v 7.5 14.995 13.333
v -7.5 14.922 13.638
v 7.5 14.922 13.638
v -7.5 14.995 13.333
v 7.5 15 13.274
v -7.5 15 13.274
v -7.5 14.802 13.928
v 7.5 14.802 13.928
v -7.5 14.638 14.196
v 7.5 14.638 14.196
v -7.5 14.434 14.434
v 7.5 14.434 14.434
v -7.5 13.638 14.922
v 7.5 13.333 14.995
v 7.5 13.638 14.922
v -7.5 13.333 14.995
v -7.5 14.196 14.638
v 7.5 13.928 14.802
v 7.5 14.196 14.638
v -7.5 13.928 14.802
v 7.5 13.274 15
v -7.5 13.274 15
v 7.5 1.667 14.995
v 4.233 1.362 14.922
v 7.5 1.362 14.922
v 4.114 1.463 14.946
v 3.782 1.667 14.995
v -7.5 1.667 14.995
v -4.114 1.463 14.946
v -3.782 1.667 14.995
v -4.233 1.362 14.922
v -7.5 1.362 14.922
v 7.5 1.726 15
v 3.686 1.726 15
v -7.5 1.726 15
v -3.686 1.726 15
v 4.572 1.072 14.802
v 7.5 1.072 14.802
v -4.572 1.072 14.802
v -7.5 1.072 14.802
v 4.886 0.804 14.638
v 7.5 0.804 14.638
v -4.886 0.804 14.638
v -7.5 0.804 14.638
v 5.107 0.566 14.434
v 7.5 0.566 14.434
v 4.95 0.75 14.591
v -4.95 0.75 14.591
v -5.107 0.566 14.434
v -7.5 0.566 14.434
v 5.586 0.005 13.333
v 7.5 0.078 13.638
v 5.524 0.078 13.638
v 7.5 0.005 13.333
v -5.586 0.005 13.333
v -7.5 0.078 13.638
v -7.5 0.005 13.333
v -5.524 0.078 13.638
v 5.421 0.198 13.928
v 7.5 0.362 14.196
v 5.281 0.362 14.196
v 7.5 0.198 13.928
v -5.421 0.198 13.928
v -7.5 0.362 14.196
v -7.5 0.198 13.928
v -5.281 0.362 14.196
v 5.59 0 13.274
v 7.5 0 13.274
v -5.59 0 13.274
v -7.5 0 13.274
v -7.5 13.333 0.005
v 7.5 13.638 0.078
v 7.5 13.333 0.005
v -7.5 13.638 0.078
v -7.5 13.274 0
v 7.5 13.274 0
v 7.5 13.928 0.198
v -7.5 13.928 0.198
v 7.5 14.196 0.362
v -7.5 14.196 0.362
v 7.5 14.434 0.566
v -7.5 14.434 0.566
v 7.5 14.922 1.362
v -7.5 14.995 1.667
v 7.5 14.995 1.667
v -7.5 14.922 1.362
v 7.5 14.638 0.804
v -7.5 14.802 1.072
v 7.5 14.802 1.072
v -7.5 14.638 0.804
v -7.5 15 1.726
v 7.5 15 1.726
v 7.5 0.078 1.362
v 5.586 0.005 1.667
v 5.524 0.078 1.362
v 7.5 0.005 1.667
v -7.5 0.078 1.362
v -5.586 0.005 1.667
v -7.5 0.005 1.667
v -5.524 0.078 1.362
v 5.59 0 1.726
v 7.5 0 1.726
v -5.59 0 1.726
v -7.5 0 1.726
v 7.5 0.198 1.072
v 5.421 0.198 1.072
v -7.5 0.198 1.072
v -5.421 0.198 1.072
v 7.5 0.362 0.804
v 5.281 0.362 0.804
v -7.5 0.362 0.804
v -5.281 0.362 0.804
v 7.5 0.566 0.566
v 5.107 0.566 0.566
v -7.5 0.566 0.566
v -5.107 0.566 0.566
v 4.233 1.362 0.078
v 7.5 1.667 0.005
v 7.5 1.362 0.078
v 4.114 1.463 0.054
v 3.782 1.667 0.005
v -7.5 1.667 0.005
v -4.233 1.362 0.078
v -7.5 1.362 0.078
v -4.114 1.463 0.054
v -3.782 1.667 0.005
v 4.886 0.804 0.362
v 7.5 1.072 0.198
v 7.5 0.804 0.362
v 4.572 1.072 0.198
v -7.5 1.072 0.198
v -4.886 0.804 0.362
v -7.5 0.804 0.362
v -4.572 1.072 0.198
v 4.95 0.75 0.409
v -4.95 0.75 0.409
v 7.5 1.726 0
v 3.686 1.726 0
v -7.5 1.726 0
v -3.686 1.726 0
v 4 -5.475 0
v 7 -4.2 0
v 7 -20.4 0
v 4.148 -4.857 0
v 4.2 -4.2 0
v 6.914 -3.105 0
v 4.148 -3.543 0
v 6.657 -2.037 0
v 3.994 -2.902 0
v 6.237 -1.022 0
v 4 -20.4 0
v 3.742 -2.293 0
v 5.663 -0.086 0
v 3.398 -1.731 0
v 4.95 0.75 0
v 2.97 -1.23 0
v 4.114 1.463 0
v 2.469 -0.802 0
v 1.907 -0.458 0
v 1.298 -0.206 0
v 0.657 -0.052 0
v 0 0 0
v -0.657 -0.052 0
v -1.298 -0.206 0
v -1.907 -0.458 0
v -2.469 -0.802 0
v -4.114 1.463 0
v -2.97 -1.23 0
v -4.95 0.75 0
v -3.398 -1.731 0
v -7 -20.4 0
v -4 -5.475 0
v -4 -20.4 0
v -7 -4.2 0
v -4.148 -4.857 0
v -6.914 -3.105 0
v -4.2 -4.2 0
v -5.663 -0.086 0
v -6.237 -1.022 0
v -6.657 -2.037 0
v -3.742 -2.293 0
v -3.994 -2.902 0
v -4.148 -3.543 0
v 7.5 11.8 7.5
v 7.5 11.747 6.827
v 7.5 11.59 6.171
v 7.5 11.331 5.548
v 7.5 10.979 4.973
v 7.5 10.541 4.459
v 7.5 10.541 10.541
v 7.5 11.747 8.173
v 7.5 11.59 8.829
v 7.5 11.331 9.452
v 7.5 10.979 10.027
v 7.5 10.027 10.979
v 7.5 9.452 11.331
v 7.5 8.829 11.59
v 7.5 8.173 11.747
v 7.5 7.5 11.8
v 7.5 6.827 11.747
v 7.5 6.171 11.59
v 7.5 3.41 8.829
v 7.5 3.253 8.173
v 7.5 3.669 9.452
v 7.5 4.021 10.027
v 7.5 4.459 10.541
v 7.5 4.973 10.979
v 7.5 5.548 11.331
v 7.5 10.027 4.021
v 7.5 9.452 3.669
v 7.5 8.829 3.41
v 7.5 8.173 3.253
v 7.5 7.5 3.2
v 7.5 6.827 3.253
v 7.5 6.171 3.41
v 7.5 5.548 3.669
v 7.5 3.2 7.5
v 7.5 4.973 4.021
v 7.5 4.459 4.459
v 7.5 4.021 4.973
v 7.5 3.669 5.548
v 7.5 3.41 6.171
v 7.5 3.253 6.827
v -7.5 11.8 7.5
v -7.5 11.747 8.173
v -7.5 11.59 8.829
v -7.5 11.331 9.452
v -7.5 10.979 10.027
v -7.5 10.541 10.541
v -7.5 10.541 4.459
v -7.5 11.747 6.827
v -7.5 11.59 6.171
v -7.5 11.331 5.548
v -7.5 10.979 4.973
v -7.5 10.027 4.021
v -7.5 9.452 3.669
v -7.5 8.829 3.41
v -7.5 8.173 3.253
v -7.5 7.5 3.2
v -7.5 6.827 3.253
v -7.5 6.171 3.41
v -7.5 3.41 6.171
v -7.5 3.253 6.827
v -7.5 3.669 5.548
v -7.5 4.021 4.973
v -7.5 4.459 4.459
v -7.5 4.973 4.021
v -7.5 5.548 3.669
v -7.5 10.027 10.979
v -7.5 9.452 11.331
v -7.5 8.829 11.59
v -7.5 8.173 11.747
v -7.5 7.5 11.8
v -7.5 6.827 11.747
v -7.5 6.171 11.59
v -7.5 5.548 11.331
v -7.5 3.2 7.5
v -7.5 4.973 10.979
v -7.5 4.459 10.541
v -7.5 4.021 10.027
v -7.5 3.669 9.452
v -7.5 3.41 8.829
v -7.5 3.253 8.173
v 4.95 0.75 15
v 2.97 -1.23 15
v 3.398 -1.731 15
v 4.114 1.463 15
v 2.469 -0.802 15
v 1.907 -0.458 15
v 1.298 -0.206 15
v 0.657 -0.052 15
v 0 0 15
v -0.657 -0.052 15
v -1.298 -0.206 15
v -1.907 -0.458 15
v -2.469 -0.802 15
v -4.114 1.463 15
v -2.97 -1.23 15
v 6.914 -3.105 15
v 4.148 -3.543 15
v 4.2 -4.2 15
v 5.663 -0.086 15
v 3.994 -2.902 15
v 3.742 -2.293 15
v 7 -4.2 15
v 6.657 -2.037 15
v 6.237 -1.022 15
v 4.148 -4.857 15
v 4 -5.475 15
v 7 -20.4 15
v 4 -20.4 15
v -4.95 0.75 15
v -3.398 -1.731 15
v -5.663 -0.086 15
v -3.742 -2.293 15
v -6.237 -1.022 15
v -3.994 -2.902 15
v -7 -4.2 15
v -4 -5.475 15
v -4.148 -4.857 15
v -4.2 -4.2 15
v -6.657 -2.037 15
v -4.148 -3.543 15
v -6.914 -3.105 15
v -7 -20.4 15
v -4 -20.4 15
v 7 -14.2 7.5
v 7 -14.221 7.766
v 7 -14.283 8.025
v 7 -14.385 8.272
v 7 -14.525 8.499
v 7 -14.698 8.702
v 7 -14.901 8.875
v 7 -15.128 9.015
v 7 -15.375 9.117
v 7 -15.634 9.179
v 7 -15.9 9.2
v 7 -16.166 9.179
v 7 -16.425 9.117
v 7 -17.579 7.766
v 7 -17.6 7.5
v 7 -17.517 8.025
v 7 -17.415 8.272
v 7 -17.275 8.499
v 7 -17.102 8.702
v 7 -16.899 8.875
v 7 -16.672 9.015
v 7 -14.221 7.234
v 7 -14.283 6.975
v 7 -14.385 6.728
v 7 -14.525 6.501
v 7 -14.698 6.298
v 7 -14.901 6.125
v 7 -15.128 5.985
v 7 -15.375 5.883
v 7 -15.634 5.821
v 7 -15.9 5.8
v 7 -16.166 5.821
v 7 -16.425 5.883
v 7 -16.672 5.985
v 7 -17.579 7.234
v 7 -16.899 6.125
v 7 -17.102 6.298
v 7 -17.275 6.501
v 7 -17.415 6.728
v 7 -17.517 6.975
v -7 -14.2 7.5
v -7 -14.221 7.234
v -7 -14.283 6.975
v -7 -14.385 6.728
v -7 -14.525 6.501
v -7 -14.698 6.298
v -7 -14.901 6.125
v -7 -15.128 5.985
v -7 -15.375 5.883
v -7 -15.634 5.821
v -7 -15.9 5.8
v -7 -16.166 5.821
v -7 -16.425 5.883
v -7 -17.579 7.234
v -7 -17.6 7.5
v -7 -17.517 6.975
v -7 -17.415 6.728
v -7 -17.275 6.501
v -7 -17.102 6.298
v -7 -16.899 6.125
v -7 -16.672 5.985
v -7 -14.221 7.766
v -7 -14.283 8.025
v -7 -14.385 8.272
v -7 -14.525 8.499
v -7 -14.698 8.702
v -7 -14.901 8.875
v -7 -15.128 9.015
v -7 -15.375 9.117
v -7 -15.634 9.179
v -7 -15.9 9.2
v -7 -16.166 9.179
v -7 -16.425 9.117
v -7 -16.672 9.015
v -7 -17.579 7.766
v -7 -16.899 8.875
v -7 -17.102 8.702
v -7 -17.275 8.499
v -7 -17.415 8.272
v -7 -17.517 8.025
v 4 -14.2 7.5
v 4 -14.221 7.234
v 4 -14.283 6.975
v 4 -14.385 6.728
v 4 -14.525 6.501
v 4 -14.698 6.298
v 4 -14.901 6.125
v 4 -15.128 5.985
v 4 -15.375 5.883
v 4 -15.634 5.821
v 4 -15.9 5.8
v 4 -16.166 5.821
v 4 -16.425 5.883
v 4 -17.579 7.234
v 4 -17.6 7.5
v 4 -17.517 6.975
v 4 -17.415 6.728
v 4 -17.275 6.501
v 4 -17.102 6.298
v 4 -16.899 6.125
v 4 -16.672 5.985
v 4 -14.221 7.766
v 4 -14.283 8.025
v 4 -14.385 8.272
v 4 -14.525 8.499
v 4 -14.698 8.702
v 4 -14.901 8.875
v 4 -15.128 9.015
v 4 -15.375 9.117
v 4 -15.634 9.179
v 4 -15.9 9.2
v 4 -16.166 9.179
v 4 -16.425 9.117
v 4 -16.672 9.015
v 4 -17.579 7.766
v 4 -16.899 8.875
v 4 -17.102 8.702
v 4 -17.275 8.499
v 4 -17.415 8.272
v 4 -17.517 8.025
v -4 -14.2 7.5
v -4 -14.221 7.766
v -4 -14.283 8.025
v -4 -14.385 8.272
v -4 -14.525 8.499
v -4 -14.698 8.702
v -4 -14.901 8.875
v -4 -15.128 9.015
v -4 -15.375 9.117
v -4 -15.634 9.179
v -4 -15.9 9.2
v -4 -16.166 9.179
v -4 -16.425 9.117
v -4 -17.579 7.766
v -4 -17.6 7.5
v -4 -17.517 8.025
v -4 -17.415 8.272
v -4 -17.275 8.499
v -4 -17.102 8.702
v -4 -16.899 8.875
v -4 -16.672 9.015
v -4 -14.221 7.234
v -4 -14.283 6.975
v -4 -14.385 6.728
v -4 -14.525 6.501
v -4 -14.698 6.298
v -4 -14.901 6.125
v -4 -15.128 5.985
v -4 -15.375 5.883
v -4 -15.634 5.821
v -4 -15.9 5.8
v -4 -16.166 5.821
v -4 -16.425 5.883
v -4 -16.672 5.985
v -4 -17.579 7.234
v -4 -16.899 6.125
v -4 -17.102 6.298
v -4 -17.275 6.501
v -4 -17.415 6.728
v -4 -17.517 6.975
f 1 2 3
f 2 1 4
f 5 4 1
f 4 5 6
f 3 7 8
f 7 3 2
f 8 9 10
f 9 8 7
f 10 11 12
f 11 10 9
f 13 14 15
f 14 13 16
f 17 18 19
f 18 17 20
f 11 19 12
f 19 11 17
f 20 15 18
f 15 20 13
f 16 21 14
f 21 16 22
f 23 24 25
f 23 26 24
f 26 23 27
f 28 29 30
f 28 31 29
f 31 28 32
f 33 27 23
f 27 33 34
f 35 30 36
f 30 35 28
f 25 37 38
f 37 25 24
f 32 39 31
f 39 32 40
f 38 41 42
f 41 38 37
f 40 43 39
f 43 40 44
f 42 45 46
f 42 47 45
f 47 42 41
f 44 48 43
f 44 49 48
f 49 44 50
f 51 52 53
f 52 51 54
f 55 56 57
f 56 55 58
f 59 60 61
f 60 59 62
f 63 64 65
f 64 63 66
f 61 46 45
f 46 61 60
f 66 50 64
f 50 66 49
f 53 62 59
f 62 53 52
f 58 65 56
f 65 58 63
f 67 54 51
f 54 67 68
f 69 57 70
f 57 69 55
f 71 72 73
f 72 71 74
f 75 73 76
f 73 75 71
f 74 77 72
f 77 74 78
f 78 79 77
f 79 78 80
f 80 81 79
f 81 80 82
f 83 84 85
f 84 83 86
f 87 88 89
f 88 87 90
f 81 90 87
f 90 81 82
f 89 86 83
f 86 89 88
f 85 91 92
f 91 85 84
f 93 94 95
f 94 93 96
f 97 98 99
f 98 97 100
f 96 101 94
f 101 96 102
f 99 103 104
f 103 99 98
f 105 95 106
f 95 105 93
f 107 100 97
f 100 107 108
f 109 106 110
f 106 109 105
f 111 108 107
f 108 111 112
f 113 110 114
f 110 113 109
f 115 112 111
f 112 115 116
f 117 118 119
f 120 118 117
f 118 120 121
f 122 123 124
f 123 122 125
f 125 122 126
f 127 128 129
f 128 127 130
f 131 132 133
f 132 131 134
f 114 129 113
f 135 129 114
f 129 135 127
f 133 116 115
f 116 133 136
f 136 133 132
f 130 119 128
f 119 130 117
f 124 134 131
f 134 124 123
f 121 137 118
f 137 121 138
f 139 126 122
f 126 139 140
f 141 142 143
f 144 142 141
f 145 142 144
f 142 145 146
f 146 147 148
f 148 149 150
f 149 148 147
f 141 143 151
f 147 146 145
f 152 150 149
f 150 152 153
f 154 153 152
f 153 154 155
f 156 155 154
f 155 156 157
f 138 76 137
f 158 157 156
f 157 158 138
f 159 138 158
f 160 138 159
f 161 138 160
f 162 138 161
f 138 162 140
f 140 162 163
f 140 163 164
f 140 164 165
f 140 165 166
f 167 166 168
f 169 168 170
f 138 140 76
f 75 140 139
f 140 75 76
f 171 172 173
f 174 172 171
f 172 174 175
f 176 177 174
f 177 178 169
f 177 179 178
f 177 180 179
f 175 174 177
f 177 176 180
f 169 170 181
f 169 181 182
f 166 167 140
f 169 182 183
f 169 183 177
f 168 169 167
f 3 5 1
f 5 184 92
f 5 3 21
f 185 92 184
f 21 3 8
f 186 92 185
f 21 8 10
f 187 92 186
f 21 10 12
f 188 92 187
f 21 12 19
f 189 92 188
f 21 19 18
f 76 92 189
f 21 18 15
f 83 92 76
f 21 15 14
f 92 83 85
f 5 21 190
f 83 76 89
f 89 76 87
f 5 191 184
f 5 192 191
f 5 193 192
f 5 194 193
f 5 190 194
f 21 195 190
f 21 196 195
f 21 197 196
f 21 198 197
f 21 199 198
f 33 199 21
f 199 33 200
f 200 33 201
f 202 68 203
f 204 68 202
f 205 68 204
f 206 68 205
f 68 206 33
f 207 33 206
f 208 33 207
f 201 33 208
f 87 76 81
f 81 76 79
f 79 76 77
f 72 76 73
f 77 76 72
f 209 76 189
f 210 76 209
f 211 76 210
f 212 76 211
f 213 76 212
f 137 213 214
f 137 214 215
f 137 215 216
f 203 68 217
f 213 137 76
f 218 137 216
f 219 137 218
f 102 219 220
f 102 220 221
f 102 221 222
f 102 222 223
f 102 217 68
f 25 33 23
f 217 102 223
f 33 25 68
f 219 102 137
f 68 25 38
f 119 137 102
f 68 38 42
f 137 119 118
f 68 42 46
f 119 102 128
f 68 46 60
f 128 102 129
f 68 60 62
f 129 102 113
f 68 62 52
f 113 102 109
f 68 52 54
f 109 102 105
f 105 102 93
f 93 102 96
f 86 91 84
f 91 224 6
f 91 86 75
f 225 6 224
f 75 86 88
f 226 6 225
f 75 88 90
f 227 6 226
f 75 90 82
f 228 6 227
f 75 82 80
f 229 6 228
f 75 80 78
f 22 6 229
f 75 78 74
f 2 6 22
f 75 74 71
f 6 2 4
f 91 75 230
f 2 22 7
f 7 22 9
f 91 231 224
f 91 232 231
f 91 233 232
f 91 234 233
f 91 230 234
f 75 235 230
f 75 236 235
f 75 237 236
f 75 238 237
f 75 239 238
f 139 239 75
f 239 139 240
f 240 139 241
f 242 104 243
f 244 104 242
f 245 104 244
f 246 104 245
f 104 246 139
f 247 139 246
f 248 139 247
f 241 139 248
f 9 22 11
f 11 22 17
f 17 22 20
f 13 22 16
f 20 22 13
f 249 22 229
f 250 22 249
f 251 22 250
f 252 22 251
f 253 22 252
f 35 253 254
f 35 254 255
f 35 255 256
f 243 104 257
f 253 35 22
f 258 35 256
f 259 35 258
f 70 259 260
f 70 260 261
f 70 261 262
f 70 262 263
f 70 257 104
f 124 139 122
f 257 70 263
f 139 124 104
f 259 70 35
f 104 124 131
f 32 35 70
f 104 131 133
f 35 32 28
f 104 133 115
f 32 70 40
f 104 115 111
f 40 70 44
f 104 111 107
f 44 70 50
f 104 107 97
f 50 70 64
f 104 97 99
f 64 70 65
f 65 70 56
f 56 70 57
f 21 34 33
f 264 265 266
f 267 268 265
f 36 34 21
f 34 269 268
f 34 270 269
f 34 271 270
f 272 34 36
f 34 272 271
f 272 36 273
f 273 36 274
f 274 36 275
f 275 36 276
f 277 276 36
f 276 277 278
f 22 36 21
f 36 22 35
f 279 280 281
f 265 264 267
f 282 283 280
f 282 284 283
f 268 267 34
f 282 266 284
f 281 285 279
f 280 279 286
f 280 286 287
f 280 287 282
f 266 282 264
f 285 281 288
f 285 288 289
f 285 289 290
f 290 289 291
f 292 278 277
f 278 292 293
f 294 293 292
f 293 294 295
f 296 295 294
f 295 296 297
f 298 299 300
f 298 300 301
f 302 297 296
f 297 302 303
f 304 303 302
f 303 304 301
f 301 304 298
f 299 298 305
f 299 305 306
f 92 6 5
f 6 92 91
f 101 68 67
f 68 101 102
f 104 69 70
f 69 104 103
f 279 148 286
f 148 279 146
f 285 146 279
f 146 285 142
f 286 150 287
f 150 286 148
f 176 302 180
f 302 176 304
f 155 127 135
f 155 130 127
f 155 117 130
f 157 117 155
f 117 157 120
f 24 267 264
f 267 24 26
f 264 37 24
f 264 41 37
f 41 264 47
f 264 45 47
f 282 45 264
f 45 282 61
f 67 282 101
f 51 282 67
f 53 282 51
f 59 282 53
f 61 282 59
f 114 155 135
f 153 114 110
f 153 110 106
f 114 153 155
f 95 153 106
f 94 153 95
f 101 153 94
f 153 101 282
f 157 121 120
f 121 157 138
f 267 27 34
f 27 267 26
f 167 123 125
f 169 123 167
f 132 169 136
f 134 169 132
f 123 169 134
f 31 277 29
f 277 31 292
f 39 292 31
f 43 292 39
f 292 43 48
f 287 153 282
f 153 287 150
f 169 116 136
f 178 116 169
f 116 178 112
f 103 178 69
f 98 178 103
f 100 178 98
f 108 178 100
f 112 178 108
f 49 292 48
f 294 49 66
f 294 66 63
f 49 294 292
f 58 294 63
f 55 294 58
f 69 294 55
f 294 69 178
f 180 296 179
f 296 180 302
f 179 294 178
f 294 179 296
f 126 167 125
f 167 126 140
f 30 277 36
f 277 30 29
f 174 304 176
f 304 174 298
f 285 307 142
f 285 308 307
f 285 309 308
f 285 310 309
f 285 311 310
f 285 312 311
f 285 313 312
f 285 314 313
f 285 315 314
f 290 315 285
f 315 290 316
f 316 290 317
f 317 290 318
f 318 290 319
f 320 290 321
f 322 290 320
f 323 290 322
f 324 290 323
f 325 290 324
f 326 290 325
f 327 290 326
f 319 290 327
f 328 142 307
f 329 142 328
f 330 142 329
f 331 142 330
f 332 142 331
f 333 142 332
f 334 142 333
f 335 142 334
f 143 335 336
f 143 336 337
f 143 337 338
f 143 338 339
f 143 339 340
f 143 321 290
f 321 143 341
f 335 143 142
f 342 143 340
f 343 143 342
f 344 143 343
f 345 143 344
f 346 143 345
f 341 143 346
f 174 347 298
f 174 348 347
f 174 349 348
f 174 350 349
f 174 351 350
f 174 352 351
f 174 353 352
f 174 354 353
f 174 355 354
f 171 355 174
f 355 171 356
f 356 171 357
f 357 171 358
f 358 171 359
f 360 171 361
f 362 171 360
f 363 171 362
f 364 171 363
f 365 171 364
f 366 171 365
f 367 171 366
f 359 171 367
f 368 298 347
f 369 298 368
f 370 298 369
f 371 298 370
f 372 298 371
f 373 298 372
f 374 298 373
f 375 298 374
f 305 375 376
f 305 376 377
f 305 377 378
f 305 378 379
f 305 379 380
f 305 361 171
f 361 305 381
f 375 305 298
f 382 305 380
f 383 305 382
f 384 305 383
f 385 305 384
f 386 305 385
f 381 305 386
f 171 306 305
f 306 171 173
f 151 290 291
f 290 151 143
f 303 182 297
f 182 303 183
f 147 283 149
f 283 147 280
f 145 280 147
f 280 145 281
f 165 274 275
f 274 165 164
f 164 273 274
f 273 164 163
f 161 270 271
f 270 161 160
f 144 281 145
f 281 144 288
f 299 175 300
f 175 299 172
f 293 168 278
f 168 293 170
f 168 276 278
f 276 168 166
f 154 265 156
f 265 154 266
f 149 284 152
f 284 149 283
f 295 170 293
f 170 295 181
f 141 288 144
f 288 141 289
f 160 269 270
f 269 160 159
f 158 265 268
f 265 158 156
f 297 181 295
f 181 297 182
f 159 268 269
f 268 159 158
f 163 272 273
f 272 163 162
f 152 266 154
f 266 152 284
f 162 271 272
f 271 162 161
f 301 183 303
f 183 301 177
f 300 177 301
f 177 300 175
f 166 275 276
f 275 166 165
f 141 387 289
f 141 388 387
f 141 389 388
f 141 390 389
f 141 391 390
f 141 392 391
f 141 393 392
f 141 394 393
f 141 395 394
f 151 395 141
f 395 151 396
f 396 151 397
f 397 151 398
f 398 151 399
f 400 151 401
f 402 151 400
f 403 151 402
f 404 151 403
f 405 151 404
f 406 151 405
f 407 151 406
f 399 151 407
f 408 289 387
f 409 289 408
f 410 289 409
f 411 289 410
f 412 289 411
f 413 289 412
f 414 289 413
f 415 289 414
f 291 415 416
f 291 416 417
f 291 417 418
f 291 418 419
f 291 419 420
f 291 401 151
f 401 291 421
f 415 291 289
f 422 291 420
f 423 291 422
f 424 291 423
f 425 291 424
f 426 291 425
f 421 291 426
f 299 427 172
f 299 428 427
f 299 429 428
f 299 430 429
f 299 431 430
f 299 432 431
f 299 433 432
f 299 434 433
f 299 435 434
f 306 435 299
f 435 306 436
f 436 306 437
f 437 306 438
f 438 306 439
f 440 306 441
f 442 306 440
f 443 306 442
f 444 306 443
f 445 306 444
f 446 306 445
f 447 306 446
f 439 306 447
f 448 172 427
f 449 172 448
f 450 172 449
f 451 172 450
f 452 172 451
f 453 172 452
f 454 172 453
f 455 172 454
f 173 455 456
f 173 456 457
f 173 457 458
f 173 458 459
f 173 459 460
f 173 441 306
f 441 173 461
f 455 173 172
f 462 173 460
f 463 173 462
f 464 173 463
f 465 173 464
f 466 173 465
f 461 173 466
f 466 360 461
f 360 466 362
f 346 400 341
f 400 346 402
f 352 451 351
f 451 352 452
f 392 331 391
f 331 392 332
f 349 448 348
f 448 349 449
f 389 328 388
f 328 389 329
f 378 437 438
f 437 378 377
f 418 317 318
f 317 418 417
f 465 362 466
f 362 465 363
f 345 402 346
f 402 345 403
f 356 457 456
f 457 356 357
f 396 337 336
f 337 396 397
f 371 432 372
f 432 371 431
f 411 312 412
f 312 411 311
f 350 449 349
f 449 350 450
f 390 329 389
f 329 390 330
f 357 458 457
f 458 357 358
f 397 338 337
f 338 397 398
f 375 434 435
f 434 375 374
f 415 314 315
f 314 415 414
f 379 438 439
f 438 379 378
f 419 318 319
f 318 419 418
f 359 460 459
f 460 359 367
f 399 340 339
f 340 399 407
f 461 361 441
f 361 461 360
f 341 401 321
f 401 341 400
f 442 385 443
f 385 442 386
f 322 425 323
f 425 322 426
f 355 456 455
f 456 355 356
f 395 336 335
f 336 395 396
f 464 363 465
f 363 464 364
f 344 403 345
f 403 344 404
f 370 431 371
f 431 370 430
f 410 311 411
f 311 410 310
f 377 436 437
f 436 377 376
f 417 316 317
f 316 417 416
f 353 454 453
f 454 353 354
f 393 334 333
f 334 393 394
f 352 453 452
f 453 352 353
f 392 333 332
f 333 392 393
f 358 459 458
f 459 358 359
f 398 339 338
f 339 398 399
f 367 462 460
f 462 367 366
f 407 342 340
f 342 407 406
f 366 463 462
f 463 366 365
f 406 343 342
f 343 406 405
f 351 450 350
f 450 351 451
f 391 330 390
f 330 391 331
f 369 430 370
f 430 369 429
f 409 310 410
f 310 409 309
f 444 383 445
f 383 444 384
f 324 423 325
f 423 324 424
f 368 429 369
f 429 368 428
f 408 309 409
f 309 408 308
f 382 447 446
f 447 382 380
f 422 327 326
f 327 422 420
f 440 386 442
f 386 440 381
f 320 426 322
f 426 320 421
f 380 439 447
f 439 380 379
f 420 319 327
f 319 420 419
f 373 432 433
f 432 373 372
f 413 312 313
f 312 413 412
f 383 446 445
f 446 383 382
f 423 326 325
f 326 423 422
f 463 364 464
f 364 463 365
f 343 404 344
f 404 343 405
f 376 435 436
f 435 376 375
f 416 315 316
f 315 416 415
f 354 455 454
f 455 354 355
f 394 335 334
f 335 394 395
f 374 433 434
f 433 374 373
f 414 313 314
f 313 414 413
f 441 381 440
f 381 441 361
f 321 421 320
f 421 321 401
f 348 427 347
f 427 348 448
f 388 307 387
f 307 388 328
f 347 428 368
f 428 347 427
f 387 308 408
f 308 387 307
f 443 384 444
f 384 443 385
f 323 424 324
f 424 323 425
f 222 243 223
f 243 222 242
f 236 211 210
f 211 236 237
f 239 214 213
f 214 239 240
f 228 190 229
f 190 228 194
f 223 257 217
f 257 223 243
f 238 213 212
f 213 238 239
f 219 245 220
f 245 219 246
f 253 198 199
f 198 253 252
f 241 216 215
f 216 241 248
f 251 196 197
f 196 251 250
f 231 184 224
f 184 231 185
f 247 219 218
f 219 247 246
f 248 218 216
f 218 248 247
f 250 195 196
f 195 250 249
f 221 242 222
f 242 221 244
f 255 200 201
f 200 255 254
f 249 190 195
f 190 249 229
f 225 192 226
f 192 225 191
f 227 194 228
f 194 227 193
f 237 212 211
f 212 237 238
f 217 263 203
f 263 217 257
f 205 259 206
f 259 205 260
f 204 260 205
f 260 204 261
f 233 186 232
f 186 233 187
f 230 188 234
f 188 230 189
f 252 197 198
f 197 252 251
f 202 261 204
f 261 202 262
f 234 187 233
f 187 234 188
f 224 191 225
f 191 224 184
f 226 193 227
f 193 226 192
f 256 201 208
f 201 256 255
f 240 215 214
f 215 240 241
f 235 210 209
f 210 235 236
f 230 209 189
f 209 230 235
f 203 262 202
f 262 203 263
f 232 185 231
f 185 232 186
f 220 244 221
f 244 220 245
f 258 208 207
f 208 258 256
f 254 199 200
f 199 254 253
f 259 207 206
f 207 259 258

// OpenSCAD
// file: library/component-data.scad
// ========================================================================================
// Robori Mendel
// Dimensions of standard components
// GNU GPL v3
//
// Contact : support@robori.com
// Reference : http://www.robori.com/documentation/Mendel
//
// History :
// 31 Jan 2015 - First version
// ========================================================================================

// Linear bearing LM8UU
LM8UU_L = 24;
LM8UU_OD = 15;
LM8UU_ID = 8;

// Pulley GT2
PULLEY_GT2_ID = 5;
PULLEY_GT2_OD = 18;
PULLEY_GT2_L = 18.5;
PULLEY_GT2_FLANGE_L = 1.5;
PULLEY_GT2_TEETH_L = 7.5;
PULLEY_GT2_TEETH_OD = 10;
PULLEY_GT2_HUB_L =  PULLEY_GT2_L - PULLEY_GT2_FLANGE_L - PULLEY_GT2_TEETH_L;		// = 9.5

// Nylock nut
NYLOCK_NUT_M5_H = 5;

// NEMA 17
NEMA17_L = 42;
NEMA17_SCREW_FROM_EDGE = (42 - 31)/2;
NEMA17_SCREW_SIZE = 3;

// Fan 40mm x 40mm
FAN40_L = 40;
FAN40_ID = 38;
FAN40_SCREW_D = 3.4;
FAN40_SCREW_FROM_EDGE = 4;

// Washer
WASHER_M3_ID = 3.2;
WASHER_M3_OD = 6;
WASHER_M3_H = 0.5;
// file: library/component.scad
// ========================================================================================
// Robori Mendel
// RP library
// GNU GPL v3
//
// Contact : support@robori.com
// Reference : http://www.robori.com/documentation/Mendel
//
// History :
// 31 Jan 2015 - First version
// ========================================================================================

include <component-data.scad>

component_fn = 25;

// Rod clamp
module clamp(in_dia, out_dia, leg_length, leg_space, height, screw_dia, screw_dist_from_end)
{
	difference()
	{
		union()
		{
			cylinder(h=height, r=out_dia/2, center=false, $fn=component_fn);
			translate([-out_dia/2, -in_dia/2 - leg_length, 0]) cube([out_dia, in_dia/2 + leg_length, height]);
		}
		// hole
		translate([0, 0, -1]) cylinder(h=height + 2, r=in_dia/2, center=false, $fn=component_fn);
		// leg space
		translate([-leg_space/2, -in_dia/2 - leg_length - 1, -1]) cube([leg_space, in_dia/2 + leg_length + 1, height + 2]);
		// screw hole
		translate([-out_dia/2 - 1, -in_dia/2 - leg_length + screw_dist_from_end, height/2]) rotate([0, 90, 0]) cylinder(h=out_dia + 2, r=screw_dia/2, center=false, $fn=component_fn);
	}
}

// LM8UU holder
lm8uu_holder_wall_t = 3;
lm8uu_holder_cone_l = 2;
lm8uu_holder_slot_w = 9;
lm8uu_holder_id = LM8UU_OD - 0.1;
lm8uu_holder_l = LM8UU_L + lm8uu_holder_cone_l;
lm8uu_holder_w = LM8UU_OD + 2*lm8uu_holder_wall_t;
lm8uu_holder_h = LM8UU_OD + 2*lm8uu_holder_cone_l;

module lm8uu_holder()
{
	cone_d1 = 0;
	cone_d2 = LM8UU_OD + 2*lm8uu_holder_cone_l;
	cone_h = cone_d2/2;

	difference()
	{
		// Block
		cube([lm8uu_holder_l, lm8uu_holder_w, lm8uu_holder_h]);
		// Cylinder
		translate([-1, lm8uu_holder_w/2, lm8uu_holder_cone_l + LM8UU_OD/2]) rotate([0, 90, 0]) cylinder(r=lm8uu_holder_id/2, h=lm8uu_holder_l + 2, center=false, $fn=component_fn);
		// Cone
		translate([lm8uu_holder_l - cone_h + 0.01, lm8uu_holder_w/2, lm8uu_holder_cone_l + LM8UU_OD/2]) rotate([0, 90, 0]) cylinder(r1=cone_d1/2, r2=cone_d2/2, h=cone_h, center=false, $fn=component_fn);
		// Slot
		translate([-1, lm8uu_holder_w/2 - lm8uu_holder_slot_w/2, lm8uu_holder_h - lm8uu_holder_cone_l*2 - 1]) cube([lm8uu_holder_l + 2, lm8uu_holder_slot_w, lm8uu_holder_cone_l*2 + 2]);
	}
}
// file: library/library_3d.scad
// ========================================================================================
// Robori Mendel
// General 3D library
// GNU GPL v3
//
// Contact : support@robori.com
// Reference : http://www.robori.com/documentation/Mendel
//
// History :
// 2013 - First version
// ========================================================================================

lib3d_fn = 50;

// TESTING
//lib3d_hex_nut_recess(3);
//lib3d_round_cube(10, 8, 10, 1, true, false, true, false);


// Hexagonal nut recess
module lib3d_hex_nut_recess(size)
{
	length = 0.8*size;
	hex_r = 1.8*size/2;
	cylinder(h=length, r=hex_r, center=false, $fn=6);
}

// Cube with customized rounded corners
module lib3d_round_cube(x, y, z, rad, left_top=true, left_bottom=true, right_top=true, right_bottom=true)
{
	rx = x/2 - rad + 0.02;
	ry = y/2 - rad + 0.02;

	translate([x/2, y/2, 0]) difference()
	{	
		translate([-x/2, -y/2, 0]) cube([x, y, z]);
		if (left_top)
			translate([-rx, ry, -1]) rotate([0, 0, 90]) __lib3d_round_corner(rad, z + 2);
		if (left_bottom)
			translate([-rx, -ry, -1]) rotate([0, 0, 180]) __lib3d_round_corner(rad, z + 2);
		if (right_top)
			translate([rx, ry, -1]) __lib3d_round_corner(rad, z + 2);
		if (right_bottom)
			translate([rx, -ry, -1]) rotate([0, 0, 270]) __lib3d_round_corner(rad, z + 2);
	}
}

// Helper
module __lib3d_round_corner(rad, height)
{
	difference()
	{
		cube([rad, rad, height]);
		cylinder(h=height, r=rad, center=false, $fn=lib3d_fn);
	}
}
// main file
// ========================================================================================
// Robori Mendel
// Filament holder clamp front
// GNU GPL v3
//
// Contact : support@robori.com
// Reference : http://www.robori.com/documentation/Mendel
//
// History :
// 17 Jun 2015 - First version
// ========================================================================================

include <library/library_3d.scad>
include <library/component.scad>

$fn = 40;
lib3d_fn = 40;
component_fn = 40;

// rod holder
holder_l = 15;
holder_w = 15;
holder_h = 15;
holder_id = 8 + 0.6;
holder_r = 2;

// clamp
clamp_id = 8 + 0.4;
clamp_od = 8 + 2*3;
clamp_leg_length = 12;
clamp_leg_space = 8;
clamp_h = 15;
clamp_screw_d = 3 + 0.4;
clamp_screw_dist = 4.5;

filament_holder_clamp();

module filament_holder_clamp()
{
	difference()
	{
		union()
		{
			// rod holder block
			translate([-holder_l/2, 0, holder_h]) rotate([0, 90, 0]) lib3d_round_cube(holder_h, holder_w, holder_l, holder_r, true, true, true, true);
			// clamp
			translate([0, -clamp_id/2, 0]) clamp(clamp_id, clamp_od, clamp_leg_length, clamp_leg_space, clamp_h, clamp_screw_d, clamp_screw_dist);
		}
		// rod holder hole 
		translate([-holder_l/2 - 1, holder_w/2, holder_h/2]) rotate([0, 90, 0]) cylinder(r=holder_id/2, h=holder_l + 2, center=false);
	}
}
